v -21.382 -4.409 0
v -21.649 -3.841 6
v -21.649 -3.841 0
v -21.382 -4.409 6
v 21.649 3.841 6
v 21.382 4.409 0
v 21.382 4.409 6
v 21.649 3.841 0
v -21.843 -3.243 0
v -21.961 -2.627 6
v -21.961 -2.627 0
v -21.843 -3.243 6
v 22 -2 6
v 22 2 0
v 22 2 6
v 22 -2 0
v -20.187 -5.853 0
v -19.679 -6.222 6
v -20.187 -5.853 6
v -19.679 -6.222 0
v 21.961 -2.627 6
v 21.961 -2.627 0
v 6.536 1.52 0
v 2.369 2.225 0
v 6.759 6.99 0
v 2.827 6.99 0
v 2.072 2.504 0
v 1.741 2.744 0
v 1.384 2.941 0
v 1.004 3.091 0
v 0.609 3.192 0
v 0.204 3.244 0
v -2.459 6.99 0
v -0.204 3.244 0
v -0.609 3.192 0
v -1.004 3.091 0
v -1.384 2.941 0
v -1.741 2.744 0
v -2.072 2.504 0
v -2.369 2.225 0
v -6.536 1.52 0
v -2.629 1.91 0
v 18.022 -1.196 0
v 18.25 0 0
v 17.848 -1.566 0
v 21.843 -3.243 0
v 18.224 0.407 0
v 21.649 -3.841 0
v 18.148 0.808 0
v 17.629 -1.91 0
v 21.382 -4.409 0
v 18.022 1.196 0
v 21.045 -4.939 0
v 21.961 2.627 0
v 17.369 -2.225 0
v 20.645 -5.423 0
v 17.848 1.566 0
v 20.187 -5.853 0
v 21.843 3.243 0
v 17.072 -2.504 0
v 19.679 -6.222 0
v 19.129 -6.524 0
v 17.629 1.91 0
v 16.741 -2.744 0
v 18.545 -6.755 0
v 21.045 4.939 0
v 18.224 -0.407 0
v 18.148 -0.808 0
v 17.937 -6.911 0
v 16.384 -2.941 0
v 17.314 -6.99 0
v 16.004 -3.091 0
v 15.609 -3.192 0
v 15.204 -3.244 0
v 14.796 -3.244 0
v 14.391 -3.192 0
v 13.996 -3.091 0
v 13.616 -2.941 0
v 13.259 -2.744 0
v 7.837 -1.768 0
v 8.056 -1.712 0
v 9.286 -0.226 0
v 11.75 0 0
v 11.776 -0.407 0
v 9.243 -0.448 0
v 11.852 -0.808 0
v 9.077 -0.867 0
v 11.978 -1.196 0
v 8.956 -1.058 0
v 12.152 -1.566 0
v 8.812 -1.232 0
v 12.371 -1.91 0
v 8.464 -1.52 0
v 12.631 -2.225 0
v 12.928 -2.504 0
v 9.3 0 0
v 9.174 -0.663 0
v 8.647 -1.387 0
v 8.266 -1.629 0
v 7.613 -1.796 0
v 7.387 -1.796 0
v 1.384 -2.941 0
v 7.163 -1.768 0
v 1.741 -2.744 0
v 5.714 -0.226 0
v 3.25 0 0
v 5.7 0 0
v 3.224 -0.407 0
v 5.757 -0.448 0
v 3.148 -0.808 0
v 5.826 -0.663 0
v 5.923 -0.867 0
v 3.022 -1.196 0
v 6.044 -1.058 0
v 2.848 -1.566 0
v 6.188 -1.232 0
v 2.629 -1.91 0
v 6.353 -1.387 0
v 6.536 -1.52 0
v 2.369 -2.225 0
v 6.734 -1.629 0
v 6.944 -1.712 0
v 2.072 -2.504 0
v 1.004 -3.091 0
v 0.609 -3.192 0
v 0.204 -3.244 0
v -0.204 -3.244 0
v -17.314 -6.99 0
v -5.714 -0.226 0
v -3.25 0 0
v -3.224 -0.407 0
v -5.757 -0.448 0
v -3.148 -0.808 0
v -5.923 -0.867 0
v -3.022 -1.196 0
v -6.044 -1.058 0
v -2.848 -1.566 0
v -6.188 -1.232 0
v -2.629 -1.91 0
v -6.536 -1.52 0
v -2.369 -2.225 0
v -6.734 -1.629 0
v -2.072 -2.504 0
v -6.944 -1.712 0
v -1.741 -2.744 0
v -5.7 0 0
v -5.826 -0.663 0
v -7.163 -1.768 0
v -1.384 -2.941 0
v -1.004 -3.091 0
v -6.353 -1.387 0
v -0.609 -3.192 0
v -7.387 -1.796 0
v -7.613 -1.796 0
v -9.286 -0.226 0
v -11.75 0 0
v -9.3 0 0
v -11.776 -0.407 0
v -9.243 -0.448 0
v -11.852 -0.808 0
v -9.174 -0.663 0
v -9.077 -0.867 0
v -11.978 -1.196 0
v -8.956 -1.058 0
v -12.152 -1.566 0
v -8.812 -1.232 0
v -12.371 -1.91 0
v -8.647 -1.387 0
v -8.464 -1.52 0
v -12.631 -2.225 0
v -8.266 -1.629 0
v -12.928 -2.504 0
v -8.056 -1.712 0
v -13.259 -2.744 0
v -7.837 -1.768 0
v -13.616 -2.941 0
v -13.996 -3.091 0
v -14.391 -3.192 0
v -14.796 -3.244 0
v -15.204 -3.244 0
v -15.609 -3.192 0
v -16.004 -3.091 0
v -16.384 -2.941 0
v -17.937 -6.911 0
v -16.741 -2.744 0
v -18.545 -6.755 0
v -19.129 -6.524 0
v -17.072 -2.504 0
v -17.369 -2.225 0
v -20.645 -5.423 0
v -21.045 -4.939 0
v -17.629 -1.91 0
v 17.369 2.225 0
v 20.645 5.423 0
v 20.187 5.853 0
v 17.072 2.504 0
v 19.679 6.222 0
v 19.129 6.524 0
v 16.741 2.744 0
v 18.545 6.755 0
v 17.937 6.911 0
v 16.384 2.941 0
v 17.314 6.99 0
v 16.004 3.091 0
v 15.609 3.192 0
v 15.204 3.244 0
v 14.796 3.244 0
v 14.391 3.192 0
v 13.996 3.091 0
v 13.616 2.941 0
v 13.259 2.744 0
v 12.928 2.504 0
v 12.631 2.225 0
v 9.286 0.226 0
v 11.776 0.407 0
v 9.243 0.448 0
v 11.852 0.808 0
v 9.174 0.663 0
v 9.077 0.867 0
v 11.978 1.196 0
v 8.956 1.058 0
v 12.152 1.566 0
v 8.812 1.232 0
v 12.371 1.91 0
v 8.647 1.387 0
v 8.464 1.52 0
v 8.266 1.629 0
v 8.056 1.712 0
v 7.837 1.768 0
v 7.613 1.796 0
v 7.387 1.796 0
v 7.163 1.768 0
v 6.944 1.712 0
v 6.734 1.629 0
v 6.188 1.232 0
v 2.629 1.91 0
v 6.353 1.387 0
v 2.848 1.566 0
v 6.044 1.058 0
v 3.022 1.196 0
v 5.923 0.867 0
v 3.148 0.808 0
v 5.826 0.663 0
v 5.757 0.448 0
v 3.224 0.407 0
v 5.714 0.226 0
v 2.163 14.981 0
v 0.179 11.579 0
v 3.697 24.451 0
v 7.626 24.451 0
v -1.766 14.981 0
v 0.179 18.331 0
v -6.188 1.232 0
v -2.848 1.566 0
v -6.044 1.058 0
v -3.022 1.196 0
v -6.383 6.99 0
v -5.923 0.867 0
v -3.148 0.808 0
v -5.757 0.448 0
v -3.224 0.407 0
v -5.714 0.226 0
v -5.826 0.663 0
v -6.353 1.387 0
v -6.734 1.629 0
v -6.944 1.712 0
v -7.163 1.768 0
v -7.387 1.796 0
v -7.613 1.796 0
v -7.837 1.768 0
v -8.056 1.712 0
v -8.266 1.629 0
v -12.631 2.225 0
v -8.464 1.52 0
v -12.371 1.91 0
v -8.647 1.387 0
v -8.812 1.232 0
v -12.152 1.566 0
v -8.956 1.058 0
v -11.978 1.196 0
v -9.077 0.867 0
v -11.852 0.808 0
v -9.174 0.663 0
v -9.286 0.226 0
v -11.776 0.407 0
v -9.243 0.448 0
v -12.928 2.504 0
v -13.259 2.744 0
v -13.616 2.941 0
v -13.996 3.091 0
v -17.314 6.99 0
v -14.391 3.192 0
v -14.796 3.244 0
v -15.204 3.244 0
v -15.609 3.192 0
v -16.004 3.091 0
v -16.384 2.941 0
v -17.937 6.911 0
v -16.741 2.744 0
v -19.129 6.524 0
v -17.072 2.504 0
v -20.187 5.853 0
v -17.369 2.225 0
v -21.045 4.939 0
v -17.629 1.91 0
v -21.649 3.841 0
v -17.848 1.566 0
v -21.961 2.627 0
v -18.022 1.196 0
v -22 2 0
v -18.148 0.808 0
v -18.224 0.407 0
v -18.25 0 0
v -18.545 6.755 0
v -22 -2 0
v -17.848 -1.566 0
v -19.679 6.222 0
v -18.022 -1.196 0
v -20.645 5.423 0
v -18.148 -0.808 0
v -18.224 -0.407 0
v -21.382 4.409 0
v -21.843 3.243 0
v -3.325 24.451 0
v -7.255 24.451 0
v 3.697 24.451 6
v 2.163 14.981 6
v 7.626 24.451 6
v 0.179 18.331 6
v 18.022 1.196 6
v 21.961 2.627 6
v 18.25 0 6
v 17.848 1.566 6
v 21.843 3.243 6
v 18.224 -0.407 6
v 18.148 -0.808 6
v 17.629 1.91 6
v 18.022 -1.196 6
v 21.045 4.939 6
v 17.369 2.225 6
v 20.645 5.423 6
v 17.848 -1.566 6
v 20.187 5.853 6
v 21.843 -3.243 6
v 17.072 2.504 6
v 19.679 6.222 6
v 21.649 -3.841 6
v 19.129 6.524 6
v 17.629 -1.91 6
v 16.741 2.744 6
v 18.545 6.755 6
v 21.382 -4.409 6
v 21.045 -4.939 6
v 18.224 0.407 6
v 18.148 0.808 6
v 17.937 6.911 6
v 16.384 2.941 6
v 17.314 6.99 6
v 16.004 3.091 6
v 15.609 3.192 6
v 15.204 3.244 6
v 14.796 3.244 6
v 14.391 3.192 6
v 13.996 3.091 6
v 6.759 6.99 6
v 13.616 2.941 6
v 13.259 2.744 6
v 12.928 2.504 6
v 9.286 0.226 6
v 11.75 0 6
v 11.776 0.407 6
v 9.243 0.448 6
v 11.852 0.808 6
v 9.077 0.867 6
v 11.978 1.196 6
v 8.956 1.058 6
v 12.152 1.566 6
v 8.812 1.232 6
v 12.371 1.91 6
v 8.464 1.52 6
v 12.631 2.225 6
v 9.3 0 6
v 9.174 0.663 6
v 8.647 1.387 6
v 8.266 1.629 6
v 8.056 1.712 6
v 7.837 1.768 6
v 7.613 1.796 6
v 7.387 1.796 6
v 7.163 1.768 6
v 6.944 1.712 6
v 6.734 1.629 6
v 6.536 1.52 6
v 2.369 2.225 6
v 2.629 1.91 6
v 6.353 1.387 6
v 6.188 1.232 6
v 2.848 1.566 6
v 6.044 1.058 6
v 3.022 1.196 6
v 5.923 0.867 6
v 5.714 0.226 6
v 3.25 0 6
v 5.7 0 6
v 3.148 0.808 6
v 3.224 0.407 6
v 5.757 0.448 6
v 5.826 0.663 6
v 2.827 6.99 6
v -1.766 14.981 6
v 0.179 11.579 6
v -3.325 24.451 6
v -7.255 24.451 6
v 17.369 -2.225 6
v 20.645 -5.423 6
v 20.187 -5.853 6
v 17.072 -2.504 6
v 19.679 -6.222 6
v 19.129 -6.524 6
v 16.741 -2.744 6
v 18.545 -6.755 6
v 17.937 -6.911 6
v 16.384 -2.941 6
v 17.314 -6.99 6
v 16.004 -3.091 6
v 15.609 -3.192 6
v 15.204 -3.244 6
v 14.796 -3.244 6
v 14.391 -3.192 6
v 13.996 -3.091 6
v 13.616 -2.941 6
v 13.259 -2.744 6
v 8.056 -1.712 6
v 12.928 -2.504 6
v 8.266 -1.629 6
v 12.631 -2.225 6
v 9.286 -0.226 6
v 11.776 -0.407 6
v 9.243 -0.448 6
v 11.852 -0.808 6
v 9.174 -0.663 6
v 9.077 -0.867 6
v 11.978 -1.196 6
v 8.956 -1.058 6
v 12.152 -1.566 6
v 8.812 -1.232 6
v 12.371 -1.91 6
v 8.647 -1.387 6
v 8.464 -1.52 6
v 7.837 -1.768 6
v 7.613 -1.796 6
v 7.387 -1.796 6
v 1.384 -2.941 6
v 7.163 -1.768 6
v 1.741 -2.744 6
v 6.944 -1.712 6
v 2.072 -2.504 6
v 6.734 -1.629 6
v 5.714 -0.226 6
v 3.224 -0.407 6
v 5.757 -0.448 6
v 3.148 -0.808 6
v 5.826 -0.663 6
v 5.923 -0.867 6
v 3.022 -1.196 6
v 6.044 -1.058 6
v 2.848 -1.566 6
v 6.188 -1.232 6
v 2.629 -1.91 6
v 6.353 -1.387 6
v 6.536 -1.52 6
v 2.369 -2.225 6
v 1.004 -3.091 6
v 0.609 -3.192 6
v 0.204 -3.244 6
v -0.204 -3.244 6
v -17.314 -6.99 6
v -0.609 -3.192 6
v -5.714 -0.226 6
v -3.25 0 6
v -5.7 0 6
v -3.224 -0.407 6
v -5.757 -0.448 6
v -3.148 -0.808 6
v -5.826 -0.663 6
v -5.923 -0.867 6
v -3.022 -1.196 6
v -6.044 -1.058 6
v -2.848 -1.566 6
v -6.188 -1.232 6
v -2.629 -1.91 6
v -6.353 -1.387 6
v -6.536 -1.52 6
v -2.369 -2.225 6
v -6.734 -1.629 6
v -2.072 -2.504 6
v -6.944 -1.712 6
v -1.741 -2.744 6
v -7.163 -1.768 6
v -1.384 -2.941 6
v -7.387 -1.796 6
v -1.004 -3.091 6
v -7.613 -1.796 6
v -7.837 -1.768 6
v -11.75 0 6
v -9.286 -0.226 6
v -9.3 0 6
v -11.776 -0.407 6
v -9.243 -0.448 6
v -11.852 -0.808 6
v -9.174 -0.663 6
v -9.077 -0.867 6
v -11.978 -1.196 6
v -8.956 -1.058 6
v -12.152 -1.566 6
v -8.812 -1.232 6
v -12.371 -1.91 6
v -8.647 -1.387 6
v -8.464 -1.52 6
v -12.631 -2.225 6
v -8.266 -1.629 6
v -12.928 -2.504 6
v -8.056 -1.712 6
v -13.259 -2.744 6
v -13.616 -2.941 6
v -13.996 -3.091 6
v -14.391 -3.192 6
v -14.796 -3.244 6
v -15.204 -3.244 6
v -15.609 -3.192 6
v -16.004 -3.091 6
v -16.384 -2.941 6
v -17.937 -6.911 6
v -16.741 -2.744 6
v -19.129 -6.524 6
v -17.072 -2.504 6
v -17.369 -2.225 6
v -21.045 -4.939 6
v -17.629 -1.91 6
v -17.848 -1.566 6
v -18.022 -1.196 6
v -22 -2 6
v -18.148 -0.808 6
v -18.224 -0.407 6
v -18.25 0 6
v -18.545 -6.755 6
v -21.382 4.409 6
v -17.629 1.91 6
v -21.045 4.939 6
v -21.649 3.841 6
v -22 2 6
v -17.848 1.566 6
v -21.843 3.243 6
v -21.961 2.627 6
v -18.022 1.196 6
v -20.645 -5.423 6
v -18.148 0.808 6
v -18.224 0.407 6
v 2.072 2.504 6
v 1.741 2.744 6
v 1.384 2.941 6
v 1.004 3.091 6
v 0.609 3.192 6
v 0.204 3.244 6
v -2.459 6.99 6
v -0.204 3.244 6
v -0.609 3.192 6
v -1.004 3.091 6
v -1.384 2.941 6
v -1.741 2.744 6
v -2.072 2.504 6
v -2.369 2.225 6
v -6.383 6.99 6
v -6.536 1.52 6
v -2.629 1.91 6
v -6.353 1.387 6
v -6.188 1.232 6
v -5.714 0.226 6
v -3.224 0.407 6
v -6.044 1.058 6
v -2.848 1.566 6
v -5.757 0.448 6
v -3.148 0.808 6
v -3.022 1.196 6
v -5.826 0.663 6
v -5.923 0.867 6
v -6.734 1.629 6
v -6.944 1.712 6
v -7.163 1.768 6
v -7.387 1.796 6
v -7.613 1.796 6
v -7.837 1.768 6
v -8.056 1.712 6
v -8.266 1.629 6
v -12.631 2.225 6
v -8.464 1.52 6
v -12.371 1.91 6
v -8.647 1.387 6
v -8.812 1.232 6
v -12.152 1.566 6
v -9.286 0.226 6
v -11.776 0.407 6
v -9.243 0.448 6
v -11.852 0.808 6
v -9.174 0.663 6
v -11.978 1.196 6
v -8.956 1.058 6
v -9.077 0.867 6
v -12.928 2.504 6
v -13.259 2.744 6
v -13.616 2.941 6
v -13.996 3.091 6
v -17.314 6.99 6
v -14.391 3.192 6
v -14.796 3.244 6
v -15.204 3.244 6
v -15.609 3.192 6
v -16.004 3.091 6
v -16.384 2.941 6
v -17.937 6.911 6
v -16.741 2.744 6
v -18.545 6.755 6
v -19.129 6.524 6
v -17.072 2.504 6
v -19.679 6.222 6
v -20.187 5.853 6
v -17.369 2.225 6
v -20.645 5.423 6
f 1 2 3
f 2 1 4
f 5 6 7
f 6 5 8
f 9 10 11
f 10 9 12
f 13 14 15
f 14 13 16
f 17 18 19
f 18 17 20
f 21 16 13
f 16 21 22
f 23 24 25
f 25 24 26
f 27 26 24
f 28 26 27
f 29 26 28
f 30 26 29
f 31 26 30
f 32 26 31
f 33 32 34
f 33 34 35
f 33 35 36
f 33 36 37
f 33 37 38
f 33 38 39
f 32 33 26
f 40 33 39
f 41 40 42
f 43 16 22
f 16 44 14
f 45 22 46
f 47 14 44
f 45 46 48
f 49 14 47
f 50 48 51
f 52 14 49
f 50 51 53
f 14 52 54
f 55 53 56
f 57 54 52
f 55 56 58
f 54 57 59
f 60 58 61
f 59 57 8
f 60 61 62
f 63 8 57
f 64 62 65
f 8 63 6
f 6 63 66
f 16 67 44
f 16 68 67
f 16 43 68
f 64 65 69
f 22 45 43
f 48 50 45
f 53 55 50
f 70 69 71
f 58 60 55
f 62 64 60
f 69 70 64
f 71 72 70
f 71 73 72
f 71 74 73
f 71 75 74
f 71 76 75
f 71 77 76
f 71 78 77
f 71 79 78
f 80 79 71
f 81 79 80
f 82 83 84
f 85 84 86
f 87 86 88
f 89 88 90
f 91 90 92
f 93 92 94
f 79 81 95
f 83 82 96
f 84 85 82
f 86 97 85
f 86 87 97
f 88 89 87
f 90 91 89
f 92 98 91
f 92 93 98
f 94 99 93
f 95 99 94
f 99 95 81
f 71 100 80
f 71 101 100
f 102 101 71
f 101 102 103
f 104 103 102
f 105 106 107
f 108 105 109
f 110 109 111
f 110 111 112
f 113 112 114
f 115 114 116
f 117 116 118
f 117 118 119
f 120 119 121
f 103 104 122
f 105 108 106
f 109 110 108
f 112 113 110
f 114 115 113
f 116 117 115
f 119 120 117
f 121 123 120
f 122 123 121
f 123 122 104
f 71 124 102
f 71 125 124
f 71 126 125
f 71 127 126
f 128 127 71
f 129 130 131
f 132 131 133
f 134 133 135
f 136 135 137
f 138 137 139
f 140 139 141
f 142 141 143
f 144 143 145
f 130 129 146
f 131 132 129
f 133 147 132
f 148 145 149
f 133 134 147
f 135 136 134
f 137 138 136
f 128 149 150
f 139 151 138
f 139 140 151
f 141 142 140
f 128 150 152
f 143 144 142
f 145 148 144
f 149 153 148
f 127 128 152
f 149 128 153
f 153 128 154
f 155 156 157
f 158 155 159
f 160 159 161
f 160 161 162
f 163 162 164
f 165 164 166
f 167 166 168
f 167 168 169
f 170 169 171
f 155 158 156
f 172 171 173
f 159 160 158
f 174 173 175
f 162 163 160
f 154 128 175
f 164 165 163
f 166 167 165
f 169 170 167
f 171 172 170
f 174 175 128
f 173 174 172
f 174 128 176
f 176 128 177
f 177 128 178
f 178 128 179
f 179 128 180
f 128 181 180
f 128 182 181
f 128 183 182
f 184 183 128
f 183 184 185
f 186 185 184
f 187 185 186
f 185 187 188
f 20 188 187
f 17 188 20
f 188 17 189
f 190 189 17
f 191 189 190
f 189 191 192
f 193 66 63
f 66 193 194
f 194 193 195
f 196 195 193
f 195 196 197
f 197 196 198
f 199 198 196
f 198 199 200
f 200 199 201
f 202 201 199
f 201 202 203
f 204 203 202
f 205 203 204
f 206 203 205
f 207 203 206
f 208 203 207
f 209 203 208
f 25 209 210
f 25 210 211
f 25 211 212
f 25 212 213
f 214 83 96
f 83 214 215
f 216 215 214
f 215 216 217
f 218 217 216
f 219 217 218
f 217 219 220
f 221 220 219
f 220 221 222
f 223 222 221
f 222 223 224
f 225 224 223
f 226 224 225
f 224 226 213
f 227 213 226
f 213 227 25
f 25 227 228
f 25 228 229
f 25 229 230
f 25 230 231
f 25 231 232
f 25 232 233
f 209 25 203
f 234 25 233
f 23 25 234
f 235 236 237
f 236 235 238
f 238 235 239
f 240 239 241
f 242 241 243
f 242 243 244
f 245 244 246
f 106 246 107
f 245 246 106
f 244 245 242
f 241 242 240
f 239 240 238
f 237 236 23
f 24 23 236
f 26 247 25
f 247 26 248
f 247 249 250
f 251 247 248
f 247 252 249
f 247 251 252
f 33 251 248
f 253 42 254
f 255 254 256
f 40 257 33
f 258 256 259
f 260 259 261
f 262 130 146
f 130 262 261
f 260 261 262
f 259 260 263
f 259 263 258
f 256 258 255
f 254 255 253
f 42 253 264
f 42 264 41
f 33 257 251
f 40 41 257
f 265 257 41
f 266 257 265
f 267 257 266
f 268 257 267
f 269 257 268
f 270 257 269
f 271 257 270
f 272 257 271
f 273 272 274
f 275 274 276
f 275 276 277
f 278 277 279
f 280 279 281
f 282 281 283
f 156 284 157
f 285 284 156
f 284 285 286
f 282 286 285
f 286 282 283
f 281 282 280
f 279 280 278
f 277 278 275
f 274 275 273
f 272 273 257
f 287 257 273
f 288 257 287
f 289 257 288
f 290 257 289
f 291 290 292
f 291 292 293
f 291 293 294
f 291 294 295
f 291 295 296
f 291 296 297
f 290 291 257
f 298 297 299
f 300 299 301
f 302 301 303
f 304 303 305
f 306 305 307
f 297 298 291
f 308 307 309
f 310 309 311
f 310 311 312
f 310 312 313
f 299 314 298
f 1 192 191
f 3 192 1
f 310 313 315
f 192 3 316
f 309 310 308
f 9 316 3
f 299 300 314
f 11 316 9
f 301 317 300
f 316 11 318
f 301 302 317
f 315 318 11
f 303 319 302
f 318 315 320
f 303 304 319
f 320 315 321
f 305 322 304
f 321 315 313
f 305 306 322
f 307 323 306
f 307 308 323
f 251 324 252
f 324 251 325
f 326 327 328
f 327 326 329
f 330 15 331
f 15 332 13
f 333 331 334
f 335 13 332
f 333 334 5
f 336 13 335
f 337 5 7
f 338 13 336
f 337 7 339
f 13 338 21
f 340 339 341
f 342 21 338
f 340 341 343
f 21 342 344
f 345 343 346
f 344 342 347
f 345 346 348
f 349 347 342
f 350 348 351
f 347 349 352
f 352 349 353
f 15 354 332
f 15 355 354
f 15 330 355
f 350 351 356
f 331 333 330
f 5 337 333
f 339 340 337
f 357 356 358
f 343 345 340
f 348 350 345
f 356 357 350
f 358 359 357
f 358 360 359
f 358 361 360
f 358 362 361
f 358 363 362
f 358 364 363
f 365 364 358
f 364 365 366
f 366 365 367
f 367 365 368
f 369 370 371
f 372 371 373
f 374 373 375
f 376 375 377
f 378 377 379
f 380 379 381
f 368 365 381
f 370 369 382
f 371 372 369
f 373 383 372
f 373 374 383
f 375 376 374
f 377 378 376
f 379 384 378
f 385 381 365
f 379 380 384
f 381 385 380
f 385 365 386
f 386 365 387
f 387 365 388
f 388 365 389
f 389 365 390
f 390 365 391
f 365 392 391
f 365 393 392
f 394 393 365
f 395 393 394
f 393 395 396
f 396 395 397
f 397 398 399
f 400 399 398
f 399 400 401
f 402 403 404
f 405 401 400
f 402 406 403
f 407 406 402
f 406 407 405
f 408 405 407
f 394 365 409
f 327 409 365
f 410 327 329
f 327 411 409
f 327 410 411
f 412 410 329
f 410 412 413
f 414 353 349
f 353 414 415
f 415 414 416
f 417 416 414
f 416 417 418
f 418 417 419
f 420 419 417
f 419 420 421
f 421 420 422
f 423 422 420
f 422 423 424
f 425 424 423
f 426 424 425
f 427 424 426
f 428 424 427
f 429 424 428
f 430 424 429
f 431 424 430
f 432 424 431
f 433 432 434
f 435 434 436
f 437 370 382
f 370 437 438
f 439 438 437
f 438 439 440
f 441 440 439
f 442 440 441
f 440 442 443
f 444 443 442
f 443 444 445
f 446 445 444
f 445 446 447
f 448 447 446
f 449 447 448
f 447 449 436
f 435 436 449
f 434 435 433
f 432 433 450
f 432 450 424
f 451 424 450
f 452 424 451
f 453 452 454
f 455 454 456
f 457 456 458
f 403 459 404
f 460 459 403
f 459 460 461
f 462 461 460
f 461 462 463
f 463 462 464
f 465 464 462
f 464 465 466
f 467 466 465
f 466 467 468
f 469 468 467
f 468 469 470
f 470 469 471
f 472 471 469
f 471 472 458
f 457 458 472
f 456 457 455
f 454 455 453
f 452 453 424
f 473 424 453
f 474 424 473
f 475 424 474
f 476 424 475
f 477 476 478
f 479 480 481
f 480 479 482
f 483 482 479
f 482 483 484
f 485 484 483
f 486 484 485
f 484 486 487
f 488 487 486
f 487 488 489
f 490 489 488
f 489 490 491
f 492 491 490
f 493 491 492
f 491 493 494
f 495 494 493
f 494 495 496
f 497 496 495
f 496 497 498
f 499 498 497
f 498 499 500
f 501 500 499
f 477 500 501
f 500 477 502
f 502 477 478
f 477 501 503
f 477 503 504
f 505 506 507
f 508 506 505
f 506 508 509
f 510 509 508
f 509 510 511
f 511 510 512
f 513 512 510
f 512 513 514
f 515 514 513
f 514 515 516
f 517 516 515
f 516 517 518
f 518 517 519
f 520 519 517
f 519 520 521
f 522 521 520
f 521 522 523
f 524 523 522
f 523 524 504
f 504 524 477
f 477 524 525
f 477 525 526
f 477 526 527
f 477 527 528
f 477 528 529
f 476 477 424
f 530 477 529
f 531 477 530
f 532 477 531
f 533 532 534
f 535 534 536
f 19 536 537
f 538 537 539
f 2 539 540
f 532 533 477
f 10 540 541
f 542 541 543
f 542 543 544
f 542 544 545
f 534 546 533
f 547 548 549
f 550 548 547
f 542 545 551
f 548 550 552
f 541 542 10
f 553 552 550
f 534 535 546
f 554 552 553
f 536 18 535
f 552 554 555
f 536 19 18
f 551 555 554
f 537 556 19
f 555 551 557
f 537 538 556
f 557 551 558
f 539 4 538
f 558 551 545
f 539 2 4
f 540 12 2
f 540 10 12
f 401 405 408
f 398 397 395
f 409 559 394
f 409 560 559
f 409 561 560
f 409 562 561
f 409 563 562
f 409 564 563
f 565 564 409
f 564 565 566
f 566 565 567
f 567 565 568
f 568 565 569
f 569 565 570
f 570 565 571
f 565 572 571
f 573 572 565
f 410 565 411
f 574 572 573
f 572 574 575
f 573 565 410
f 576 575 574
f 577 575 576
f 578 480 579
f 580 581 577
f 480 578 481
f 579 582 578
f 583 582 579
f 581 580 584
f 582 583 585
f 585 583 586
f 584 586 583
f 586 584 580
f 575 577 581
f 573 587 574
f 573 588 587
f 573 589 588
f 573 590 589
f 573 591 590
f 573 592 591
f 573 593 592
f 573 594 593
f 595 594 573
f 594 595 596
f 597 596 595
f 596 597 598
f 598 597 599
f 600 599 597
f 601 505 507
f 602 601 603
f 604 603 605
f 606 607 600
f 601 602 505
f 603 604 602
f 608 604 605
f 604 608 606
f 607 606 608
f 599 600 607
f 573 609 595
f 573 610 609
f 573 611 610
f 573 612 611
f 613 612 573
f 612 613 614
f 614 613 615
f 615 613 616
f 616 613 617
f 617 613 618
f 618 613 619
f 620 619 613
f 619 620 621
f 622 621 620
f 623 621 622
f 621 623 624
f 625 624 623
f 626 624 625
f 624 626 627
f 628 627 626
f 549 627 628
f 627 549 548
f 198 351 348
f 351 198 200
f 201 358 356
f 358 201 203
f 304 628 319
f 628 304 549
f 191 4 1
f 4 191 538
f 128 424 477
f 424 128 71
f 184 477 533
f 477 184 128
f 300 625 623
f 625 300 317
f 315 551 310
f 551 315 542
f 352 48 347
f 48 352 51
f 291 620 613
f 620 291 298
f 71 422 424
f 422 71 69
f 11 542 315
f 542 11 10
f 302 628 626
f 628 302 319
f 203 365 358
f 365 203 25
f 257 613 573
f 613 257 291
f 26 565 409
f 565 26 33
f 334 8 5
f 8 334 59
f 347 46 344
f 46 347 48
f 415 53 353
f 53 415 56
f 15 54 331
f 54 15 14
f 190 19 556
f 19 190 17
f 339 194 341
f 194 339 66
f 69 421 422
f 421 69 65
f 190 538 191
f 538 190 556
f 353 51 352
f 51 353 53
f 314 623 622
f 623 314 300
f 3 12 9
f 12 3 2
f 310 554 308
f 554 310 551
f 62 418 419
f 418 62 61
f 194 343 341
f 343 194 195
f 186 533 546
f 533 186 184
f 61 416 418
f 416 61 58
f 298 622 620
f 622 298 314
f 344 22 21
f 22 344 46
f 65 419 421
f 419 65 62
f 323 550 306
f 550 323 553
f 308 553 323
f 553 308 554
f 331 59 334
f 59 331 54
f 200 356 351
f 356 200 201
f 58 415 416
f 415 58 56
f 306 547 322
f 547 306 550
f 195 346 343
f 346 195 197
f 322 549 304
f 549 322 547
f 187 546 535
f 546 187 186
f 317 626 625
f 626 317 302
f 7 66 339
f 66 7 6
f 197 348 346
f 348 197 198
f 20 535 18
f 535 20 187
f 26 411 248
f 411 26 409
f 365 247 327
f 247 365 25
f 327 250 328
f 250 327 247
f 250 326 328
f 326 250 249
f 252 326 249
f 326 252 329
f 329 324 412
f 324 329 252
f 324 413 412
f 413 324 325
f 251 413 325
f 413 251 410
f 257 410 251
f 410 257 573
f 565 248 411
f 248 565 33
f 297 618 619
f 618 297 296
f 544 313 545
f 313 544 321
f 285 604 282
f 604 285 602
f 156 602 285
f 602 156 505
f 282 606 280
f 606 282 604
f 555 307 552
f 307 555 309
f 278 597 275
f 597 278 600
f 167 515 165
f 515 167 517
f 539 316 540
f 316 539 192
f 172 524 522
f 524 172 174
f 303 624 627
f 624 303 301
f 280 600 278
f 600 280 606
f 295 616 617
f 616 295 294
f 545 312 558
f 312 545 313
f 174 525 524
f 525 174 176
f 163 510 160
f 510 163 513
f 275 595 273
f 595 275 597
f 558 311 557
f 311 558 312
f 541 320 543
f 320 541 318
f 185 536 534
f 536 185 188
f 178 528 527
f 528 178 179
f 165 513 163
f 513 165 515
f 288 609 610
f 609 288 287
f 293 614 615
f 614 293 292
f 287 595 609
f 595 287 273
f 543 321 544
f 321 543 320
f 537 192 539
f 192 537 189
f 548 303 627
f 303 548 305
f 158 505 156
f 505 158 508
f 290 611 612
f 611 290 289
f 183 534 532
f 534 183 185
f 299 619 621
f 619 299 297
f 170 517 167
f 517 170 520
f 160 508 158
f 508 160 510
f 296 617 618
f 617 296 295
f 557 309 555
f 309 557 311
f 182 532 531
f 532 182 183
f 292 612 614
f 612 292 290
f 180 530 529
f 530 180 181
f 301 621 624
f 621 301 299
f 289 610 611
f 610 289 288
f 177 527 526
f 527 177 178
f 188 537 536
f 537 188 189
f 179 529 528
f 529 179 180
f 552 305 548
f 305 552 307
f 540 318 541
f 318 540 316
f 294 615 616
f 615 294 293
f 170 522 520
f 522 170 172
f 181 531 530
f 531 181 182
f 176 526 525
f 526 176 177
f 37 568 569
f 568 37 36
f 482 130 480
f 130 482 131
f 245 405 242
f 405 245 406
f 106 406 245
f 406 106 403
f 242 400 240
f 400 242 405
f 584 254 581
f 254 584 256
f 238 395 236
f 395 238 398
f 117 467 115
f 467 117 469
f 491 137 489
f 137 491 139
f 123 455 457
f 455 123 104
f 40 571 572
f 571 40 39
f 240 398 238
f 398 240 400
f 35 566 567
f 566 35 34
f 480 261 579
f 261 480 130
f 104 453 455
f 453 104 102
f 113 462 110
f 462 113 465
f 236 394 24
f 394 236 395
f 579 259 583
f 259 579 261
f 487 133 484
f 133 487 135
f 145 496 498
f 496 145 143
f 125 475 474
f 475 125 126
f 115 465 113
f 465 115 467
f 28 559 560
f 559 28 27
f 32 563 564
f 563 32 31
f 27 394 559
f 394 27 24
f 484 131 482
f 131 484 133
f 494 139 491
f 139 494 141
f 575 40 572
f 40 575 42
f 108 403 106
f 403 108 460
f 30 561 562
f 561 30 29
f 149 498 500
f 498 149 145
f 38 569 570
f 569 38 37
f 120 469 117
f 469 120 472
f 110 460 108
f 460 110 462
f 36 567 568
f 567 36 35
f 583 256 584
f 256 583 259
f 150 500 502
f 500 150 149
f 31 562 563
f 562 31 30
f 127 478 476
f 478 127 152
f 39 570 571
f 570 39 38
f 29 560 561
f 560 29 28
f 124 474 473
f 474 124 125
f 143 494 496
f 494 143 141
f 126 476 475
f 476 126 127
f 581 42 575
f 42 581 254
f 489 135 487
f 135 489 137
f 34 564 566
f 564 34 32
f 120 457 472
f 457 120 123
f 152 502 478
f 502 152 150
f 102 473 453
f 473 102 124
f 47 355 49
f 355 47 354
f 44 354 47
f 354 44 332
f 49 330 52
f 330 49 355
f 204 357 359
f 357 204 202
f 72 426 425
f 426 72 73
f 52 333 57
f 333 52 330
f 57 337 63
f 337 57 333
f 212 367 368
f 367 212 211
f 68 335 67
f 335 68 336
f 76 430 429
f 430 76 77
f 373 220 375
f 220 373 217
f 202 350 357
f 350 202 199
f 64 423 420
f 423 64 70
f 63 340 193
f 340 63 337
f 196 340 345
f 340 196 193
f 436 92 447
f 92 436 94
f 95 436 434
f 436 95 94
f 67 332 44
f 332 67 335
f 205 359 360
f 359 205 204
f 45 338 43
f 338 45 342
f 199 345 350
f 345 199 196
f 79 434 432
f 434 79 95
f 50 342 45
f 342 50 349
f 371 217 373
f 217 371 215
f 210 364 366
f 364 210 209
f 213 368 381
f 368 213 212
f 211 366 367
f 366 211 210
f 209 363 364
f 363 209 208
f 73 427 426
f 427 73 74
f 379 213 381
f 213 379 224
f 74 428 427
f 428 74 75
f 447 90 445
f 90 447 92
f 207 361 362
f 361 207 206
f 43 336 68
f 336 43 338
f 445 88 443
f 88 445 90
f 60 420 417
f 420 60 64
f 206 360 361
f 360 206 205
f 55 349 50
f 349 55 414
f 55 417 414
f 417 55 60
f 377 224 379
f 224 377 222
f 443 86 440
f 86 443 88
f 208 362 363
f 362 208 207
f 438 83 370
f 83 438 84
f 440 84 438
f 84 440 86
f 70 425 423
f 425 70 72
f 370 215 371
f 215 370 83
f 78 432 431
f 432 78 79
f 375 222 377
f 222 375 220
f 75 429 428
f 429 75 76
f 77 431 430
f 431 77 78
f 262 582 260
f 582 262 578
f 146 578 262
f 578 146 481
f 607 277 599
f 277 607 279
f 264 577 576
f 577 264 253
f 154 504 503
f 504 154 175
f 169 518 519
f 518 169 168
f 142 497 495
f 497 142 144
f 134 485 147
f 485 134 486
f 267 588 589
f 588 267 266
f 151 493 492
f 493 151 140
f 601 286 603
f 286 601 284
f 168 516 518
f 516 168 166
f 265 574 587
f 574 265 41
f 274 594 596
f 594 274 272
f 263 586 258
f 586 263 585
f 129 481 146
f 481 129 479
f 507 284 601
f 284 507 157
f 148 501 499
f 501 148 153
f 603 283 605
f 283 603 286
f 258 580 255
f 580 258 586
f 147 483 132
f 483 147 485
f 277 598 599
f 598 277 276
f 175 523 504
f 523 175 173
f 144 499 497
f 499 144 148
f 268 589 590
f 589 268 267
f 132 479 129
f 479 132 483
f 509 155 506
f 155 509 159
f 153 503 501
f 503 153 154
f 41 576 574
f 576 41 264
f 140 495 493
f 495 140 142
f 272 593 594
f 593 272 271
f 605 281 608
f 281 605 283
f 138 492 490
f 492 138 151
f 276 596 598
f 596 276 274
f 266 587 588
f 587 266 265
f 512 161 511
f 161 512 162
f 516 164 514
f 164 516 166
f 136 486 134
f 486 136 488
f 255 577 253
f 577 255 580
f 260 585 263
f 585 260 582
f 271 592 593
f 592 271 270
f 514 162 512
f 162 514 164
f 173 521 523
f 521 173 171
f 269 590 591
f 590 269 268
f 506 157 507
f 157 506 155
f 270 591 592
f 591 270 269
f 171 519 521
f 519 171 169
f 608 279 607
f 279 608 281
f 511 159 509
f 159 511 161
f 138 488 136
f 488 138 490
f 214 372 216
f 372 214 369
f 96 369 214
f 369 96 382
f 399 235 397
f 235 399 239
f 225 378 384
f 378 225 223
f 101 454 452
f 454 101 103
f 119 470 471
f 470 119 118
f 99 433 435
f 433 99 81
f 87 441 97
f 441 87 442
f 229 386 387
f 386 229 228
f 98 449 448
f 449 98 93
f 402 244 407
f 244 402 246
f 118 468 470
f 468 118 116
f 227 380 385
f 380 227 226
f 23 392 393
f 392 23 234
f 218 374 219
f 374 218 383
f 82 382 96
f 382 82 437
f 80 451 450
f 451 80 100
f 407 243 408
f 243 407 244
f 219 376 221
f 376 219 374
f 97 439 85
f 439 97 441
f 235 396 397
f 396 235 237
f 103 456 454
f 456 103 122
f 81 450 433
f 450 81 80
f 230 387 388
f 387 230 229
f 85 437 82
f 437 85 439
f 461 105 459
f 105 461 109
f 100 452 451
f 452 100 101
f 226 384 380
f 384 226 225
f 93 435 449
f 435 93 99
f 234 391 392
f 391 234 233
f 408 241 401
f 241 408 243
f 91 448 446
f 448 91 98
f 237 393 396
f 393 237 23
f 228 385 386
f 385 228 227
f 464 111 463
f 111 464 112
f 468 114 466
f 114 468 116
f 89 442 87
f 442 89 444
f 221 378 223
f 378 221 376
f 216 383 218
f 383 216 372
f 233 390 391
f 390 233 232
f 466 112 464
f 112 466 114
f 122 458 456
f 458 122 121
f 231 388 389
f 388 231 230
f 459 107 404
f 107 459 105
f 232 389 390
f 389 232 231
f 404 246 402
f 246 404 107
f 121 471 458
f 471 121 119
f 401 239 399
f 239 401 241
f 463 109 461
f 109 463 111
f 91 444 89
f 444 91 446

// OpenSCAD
$fn = 50;


difference() {
	union() {
		hull() {
			translate(v = [-17.0000000000, 2.0000000000, 0]) {
				cylinder(h = 6, r = 5);
			}
			translate(v = [17.0000000000, 2.0000000000, 0]) {
				cylinder(h = 6, r = 5);
			}
			translate(v = [-17.0000000000, -2.0000000000, 0]) {
				cylinder(h = 6, r = 5);
			}
			translate(v = [17.0000000000, -2.0000000000, 0]) {
				cylinder(h = 6, r = 5);
			}
		}
		translate(v = [0, 24, 0]) {
			linear_extrude(height = 6) {
				text(font = "DejaVu Sans Mono:style=Bold", halign = "center", size = 19.0000000000, text = "X", valign = "top");
			}
		}
	}
	union() {
		translate(v = [-15.0000000000, 0.0000000000, 0]) {
			translate(v = [0, 0, -100]) {
				cylinder(h = 200, r = 3.2500000000);
			}
		}
		translate(v = [0, 0, -100]) {
			cylinder(h = 200, r = 3.2500000000);
		}
		translate(v = [15.0000000000, 0.0000000000, 0]) {
			translate(v = [0, 0, -100]) {
				cylinder(h = 200, r = 3.2500000000);
			}
		}
		translate(v = [-15.0000000000, 0.0000000000, 0]) {
			translate(v = [0, 0, -100]) {
				cylinder(h = 200, r = 1.8000000000);
			}
		}
		translate(v = [-7.5000000000, 0.0000000000, 0]) {
			translate(v = [0, 0, -100]) {
				cylinder(h = 200, r = 1.8000000000);
			}
		}
		translate(v = [0, 0, -100]) {
			cylinder(h = 200, r = 1.8000000000);
		}
		translate(v = [7.5000000000, 0.0000000000, 0]) {
			translate(v = [0, 0, -100]) {
				cylinder(h = 200, r = 1.8000000000);
			}
		}
		translate(v = [15.0000000000, 0.0000000000, 0]) {
			translate(v = [0, 0, -100]) {
				cylinder(h = 200, r = 1.8000000000);
			}
		}
	}
}
